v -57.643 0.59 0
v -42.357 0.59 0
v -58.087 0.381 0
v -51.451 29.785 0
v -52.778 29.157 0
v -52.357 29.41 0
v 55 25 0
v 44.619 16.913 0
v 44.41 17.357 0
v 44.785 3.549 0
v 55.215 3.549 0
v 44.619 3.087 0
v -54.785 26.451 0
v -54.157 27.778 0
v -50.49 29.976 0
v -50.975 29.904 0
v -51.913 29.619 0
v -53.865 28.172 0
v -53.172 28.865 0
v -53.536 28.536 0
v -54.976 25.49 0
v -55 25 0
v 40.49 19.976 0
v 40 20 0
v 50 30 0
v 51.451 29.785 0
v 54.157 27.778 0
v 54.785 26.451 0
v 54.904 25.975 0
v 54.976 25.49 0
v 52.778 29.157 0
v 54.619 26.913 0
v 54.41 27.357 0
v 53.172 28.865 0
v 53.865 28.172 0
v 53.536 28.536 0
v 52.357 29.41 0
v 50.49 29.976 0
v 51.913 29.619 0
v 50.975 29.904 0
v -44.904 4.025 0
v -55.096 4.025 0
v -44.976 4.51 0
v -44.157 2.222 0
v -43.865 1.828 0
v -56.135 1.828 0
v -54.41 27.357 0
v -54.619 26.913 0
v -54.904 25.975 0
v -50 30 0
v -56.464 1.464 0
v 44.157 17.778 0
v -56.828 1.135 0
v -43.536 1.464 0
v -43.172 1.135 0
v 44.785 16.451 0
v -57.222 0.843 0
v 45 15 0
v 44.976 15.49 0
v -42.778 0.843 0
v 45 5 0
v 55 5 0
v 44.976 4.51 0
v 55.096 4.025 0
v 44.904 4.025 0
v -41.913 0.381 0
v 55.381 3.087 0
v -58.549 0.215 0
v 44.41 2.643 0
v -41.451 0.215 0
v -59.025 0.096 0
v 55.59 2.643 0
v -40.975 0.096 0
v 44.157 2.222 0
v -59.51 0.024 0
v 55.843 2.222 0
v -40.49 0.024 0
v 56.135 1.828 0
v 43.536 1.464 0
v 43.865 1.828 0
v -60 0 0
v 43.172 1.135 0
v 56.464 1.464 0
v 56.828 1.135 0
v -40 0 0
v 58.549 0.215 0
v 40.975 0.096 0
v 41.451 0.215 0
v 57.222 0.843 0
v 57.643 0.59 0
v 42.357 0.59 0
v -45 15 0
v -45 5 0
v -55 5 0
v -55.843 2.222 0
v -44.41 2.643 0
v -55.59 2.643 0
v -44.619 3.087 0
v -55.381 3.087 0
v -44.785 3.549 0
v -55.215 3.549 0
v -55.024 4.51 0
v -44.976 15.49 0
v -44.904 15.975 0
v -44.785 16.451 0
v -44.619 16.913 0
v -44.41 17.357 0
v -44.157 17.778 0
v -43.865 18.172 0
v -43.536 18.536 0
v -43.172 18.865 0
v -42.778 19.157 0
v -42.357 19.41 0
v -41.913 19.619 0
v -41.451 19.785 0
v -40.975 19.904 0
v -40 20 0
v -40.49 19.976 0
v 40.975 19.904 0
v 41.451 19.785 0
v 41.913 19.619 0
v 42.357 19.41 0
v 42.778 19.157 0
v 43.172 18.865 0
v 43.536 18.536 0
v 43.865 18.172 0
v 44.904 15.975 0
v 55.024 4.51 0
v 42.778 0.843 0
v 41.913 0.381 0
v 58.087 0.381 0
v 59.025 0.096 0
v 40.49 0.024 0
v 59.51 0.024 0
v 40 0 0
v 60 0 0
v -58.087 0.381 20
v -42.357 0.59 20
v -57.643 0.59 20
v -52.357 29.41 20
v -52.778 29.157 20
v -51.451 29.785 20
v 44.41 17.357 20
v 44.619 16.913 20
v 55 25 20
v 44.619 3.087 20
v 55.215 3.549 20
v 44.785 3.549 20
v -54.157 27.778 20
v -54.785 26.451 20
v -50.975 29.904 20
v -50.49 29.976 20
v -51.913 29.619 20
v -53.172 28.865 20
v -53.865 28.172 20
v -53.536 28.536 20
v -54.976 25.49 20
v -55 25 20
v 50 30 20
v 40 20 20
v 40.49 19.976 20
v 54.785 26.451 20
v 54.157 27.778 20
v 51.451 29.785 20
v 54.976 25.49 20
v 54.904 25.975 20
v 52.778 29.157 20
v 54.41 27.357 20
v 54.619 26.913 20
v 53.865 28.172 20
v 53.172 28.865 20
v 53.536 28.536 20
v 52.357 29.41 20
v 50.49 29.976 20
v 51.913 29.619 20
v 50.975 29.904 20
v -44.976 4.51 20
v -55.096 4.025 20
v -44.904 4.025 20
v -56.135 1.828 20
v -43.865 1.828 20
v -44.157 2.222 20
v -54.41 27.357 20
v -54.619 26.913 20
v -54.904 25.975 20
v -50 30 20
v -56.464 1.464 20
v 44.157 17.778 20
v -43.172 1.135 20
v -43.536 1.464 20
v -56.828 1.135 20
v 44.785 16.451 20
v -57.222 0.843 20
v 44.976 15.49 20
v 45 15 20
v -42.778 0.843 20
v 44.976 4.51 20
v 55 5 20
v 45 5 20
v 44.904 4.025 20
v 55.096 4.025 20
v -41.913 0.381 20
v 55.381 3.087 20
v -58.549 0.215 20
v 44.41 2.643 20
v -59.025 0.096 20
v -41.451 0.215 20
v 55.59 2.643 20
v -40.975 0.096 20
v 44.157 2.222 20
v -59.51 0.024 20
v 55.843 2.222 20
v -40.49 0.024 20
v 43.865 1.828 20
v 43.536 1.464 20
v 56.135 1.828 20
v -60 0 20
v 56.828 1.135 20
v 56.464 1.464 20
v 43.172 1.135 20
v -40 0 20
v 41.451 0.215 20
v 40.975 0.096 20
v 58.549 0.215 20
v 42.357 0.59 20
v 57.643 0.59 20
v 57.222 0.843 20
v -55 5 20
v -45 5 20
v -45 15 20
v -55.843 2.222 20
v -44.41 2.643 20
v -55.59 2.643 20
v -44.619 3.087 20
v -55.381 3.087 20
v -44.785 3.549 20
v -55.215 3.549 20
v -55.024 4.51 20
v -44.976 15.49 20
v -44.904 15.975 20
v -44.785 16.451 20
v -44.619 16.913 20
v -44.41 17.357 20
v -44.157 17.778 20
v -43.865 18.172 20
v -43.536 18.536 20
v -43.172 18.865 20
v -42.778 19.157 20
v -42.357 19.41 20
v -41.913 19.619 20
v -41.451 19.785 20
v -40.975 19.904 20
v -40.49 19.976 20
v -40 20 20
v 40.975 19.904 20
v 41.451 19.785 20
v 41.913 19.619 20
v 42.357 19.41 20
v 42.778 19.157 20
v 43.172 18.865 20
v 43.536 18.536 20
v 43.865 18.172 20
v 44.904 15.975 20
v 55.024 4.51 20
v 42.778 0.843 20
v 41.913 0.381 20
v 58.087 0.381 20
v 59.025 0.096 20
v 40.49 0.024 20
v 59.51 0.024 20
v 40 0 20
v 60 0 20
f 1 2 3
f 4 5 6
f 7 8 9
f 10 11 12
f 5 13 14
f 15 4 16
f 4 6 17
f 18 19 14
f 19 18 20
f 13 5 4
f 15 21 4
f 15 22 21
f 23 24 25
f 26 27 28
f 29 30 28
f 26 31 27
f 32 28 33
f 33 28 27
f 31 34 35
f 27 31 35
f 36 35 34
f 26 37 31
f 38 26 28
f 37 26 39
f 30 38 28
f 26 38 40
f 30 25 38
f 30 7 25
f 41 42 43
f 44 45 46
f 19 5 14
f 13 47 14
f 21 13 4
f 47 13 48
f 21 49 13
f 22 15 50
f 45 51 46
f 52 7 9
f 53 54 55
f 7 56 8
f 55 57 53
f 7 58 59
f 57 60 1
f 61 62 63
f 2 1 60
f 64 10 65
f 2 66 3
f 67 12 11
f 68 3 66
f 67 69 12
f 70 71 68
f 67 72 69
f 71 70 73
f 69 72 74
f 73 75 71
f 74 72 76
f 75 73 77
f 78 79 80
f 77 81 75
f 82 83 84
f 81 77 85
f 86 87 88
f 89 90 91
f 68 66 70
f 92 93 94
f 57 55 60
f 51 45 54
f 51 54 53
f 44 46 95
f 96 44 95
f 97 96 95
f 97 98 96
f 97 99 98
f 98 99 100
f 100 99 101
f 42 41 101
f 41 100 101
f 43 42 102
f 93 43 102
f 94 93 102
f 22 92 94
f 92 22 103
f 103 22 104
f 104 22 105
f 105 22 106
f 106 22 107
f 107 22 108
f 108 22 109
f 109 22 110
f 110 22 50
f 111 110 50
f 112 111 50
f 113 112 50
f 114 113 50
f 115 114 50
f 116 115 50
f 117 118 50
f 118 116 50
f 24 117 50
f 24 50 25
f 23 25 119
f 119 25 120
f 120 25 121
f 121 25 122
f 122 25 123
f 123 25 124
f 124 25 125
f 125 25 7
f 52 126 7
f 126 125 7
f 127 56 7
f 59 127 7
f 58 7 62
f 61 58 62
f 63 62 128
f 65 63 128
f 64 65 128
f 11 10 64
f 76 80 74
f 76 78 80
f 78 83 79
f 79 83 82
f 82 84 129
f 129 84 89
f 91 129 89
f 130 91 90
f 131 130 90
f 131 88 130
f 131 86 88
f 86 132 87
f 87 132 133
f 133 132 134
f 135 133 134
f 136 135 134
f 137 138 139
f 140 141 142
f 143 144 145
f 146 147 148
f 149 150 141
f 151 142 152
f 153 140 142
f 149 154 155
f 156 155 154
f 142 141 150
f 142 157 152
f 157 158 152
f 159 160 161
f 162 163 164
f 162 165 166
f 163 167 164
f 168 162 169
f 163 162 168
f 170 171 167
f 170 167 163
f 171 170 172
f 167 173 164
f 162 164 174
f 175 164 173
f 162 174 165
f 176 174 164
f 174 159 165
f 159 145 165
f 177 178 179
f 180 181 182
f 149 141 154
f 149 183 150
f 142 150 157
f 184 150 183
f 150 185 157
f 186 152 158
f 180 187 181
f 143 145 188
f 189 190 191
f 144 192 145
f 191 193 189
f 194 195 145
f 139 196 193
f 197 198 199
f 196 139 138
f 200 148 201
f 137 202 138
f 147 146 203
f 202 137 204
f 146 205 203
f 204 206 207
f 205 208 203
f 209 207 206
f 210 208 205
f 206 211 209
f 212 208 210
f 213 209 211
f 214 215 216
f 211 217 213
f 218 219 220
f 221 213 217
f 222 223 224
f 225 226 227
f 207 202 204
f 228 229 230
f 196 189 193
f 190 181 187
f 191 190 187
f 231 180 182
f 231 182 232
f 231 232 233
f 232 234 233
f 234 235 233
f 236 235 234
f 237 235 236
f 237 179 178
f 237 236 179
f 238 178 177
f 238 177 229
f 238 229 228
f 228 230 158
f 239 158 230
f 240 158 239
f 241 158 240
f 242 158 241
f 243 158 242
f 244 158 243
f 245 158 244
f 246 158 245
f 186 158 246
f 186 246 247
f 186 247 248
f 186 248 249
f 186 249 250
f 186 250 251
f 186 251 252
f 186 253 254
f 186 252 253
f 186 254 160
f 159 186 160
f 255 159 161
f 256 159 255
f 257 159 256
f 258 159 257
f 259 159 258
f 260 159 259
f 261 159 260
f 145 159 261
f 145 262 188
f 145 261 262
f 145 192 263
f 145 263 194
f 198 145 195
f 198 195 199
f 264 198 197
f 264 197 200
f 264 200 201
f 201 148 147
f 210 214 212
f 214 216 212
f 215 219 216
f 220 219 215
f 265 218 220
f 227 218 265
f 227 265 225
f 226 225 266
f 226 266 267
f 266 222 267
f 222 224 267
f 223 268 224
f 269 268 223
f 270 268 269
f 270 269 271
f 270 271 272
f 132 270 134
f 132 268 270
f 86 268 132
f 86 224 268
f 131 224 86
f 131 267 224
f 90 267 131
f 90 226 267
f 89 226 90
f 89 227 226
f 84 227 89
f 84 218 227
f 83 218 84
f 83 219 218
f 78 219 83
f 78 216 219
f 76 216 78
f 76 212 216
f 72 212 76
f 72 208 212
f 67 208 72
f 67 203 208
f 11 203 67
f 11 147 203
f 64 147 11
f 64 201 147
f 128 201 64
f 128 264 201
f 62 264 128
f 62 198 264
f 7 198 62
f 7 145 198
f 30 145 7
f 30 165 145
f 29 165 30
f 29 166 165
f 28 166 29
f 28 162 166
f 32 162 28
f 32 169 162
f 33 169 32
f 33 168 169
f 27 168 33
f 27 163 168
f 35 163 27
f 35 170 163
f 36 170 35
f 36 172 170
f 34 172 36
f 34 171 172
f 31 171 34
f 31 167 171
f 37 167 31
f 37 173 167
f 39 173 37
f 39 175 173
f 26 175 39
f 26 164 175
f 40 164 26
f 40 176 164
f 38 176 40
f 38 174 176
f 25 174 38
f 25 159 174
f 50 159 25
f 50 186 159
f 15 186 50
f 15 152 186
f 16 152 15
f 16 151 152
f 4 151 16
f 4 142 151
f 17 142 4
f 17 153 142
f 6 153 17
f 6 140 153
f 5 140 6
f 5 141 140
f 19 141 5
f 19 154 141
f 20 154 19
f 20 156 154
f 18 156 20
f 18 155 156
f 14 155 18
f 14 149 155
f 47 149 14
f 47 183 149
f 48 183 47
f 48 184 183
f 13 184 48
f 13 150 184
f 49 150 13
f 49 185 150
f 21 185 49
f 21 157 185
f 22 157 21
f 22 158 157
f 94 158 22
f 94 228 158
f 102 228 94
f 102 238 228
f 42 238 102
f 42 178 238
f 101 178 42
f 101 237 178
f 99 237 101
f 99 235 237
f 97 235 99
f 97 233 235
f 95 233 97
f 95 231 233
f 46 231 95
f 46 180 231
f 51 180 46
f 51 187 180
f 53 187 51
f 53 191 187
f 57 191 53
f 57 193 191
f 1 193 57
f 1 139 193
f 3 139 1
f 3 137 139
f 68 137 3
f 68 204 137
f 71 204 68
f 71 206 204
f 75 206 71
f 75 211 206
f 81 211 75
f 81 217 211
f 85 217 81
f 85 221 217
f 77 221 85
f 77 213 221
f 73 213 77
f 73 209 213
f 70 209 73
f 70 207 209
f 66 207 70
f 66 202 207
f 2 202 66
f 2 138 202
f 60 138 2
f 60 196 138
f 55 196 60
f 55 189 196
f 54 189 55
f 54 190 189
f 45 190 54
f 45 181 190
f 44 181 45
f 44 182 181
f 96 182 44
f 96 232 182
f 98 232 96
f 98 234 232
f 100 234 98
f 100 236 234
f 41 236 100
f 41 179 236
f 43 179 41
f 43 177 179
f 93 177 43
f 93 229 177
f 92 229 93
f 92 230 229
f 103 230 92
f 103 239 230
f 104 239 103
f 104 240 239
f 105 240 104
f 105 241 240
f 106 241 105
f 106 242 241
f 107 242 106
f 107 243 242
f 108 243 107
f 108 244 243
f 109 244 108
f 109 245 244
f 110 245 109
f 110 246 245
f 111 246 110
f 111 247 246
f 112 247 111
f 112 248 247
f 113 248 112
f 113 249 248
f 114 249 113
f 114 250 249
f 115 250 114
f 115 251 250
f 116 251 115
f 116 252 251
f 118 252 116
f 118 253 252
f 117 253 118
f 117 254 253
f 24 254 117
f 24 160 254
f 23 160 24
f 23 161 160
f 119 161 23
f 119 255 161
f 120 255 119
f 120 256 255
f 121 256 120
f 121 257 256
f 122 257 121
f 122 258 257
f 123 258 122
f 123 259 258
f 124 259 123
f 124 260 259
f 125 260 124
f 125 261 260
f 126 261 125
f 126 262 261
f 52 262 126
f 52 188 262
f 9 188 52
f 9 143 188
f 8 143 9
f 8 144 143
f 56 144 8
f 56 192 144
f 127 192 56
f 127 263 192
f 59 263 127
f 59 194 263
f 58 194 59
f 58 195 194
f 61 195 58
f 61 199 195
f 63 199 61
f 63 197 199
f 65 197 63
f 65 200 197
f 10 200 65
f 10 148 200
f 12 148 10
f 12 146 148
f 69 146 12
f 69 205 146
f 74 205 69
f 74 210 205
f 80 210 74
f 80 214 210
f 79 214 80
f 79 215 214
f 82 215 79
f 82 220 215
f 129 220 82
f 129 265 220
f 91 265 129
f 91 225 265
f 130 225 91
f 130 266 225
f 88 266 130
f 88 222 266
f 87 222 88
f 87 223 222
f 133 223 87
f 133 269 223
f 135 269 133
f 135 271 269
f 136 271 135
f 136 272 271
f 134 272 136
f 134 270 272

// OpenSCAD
// Handle (for foam insert glass/foam inserts)

$fn = 64;

// Hand-insert hole dimensions
hole_l = 90.0;
hole_w = 20.0;
hole_d = 20.0;

handle_thick = 10.0;
handle_rounding = 5.0;

module handleHole2D() {
    translate([0,hole_d/2,0])
    offset(handle_rounding) offset(-handle_rounding)
    square([hole_l, hole_d], center=true);
}

module outerFillets2D() {
    difference() {
    translate([0,(hole_d+handle_thick)/2,0])
    difference() {
        square([hole_l+2*handle_thick+2*handle_rounding, hole_d+handle_thick], center=true);
        offset(handle_rounding) offset(-handle_rounding)
        translate([-2*handle_rounding-handle_thick-hole_l/2,0,0])
        square([handle_rounding*4,hole_d+handle_thick], center=true);
        offset(handle_rounding) offset(-handle_rounding)
        translate([2*handle_rounding+handle_thick+hole_l/2,0,0])
        square([handle_rounding*4,hole_d+handle_thick], center=true);
    }
    handleHole2D();
    translate([0, hole_d-handle_rounding/2+handle_thick])
    square([hole_l+2*handle_thick+2*handle_rounding, handle_rounding], center=true);
    }
}

module handleBody2D() {
    translate([0,(hole_d+handle_thick)/2,0])
    offset(handle_rounding) offset(-handle_rounding)
    square([hole_l+2*handle_thick, hole_d+handle_thick], center=true);
}

module filletedHandle2D() {
    outerFillets2D();
    difference() {
    handleBody2D();
    handleHole2D();
    }
}

linear_extrude(hole_w, convexity=6)
filletedHandle2D();
